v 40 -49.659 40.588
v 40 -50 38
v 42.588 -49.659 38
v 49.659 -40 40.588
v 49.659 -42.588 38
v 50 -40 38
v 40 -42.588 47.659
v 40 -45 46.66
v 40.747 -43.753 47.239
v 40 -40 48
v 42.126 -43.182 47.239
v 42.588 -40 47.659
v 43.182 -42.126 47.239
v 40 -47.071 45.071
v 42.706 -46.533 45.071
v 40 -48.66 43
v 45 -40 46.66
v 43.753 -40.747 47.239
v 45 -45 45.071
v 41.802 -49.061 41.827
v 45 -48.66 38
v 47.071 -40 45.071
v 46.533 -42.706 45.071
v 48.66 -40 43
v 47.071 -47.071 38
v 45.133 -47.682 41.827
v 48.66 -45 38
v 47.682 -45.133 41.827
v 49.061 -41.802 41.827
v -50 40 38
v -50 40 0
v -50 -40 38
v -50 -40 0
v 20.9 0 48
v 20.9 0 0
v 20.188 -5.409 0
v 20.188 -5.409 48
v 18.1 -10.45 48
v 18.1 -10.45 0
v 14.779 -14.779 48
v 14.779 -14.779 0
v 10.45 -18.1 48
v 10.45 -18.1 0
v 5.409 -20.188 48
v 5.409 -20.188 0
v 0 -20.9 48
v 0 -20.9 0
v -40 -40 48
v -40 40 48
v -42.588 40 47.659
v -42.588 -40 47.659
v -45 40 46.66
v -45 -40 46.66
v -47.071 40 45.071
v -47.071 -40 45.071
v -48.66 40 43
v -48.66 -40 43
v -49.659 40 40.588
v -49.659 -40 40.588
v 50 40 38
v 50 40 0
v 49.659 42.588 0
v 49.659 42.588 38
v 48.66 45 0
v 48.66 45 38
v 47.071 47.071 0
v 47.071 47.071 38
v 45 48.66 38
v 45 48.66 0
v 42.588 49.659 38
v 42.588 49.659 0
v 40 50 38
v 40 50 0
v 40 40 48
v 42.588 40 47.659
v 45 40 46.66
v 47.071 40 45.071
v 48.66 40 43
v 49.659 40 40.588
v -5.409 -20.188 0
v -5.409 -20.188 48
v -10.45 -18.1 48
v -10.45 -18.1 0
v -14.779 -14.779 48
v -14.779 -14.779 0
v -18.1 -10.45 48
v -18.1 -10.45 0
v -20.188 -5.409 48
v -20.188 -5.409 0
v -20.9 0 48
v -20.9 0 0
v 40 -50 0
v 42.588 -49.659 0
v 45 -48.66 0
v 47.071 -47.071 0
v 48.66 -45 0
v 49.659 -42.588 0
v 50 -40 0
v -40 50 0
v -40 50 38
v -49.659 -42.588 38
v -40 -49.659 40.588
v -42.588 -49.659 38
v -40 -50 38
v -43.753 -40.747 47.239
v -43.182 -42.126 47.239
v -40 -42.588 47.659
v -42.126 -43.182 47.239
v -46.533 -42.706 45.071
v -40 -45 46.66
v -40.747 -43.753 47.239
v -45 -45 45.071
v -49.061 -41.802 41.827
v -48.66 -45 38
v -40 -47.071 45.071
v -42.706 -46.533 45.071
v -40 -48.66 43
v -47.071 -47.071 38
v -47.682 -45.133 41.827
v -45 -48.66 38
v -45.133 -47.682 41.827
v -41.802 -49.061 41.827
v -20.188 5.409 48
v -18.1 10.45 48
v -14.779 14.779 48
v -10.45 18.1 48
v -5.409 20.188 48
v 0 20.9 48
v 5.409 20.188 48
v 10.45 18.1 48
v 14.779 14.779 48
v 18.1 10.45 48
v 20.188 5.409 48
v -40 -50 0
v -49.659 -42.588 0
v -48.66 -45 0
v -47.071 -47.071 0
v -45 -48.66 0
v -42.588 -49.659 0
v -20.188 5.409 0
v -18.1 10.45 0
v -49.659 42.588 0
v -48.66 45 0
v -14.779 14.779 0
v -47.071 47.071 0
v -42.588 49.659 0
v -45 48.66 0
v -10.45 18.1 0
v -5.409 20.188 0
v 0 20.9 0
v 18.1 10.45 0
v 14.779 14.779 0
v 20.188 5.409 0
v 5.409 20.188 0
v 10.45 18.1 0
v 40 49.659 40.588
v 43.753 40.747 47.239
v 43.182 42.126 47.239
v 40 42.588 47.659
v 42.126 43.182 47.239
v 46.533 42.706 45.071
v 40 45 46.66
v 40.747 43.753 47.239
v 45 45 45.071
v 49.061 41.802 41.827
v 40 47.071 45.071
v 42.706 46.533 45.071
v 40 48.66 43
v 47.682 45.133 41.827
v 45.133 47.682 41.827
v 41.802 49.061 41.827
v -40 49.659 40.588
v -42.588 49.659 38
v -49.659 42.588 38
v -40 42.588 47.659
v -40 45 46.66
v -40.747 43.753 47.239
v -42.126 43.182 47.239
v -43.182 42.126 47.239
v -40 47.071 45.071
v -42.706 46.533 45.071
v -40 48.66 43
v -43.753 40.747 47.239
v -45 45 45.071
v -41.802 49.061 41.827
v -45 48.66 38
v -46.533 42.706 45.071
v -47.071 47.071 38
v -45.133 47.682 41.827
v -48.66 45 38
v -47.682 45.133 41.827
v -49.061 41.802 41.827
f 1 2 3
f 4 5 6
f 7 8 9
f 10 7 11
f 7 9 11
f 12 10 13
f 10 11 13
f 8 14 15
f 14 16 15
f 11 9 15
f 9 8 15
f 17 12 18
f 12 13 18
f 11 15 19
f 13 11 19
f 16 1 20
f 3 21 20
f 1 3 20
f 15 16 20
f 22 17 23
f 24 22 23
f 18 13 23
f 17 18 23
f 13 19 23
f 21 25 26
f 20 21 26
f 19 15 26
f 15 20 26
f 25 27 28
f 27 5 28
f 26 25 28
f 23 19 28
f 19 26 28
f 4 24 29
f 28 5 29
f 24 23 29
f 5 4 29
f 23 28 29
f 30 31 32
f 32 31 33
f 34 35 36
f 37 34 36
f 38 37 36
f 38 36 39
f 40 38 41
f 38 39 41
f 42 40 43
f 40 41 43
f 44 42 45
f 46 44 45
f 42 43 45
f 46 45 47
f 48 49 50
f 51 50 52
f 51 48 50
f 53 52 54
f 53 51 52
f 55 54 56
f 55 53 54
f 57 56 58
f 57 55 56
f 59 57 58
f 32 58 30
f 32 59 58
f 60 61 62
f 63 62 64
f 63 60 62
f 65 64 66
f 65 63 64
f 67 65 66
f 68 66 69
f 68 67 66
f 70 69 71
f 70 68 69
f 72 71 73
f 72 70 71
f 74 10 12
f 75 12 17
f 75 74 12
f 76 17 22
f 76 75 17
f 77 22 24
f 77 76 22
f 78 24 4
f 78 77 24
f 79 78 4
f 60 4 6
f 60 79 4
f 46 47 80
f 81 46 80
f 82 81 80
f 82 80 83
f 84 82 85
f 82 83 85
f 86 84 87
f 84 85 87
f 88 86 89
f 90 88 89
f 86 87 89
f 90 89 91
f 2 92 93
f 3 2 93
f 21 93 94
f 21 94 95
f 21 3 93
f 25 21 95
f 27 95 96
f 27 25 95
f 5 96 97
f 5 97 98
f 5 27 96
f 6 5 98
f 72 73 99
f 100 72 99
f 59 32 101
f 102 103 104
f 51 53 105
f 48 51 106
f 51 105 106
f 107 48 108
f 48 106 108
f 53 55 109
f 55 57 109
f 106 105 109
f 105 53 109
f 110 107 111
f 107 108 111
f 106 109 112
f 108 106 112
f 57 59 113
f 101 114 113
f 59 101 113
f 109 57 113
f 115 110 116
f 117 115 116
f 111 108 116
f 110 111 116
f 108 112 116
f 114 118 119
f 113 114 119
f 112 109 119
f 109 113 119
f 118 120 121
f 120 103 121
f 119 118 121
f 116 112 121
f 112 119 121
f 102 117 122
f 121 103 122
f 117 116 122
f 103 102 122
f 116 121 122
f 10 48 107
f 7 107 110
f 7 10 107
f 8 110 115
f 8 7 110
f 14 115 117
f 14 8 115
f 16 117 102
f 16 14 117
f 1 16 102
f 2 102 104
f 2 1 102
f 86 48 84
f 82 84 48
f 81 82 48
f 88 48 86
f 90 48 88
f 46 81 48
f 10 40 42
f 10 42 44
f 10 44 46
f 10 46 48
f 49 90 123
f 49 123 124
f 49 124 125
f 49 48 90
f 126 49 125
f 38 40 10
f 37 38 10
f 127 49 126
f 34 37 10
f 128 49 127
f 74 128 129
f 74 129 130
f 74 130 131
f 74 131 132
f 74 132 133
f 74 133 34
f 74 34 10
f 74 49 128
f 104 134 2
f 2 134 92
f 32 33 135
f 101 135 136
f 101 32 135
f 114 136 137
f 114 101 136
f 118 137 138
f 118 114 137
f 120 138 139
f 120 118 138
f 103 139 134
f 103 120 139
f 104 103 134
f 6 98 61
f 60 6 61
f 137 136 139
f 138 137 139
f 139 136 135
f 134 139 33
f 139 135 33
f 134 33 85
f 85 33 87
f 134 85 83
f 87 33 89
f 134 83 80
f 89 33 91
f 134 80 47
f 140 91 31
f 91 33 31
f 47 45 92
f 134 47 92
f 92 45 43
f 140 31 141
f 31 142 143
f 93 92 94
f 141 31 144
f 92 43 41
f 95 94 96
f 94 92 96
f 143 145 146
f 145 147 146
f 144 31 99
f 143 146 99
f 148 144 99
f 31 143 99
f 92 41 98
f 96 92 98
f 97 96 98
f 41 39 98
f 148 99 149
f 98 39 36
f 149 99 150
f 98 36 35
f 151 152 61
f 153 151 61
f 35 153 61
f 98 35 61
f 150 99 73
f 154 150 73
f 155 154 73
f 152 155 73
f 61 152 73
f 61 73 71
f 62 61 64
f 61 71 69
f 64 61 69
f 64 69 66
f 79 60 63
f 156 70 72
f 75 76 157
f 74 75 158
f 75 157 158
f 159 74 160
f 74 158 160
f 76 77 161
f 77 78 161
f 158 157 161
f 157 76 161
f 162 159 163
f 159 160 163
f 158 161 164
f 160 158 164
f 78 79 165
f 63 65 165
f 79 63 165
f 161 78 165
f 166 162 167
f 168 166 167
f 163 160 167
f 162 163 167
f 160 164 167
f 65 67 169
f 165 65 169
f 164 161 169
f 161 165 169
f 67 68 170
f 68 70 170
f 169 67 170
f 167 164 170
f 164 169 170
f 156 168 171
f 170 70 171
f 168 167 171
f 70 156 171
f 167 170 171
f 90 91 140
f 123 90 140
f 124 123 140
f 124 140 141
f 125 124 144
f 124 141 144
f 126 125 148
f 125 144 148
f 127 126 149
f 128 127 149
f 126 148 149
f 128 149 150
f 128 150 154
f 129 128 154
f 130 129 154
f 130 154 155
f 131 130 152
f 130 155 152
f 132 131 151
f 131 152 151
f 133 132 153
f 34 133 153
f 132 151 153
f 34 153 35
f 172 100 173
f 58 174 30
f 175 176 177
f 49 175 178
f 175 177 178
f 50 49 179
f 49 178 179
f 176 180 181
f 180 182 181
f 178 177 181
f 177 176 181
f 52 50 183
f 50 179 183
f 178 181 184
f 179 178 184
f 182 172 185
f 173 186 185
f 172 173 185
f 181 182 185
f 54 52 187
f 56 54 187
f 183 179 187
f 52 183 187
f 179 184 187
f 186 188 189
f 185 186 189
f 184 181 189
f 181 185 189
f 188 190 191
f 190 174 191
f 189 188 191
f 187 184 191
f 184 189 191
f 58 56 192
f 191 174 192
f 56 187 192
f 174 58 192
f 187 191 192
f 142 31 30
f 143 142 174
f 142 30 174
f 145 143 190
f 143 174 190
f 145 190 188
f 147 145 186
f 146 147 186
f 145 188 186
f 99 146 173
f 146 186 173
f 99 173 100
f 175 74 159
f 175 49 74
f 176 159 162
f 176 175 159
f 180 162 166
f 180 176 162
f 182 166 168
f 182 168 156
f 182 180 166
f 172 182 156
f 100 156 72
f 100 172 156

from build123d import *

# Parameters (mm, degrees)
EXTRUDE_1_DEPTH = 48
FILLET_1_R      = 10
FILLET_3_R      = 10


with BuildPart() as part:
    # 草图1 → 凸台-拉伸1 (new body)
    with BuildSketch(Plane.XY):
        with BuildLine():
            Line((0, 20.9), (0, 25))
            Line((0, 25), (0, 48.210201589))
            Line((0, 48.210201589), (0, 50))
            Line((0, 50), (-50, 50))
            Line((-50, 50), (-50, 0))
            Line((-50, 0), (-20.9, 0))
            ThreePointArc((-20.9, 0), (-14.778531727, 14.778531727), (0, 20.9))
        make_face()
        with BuildLine():
            Line((50, 0), (20.9, 0))
            ThreePointArc((20.9, 0), (14.778531727, -14.778531727), (0, -20.9))
            Line((0, -20.9), (0, -25))
            Line((0, -25), (50, -25))
            Line((50, -25), (50, 0))
        make_face()
        with BuildLine():
            Line((50, 25), (0, 25))
            Line((0, 25), (0, 20.9))
            ThreePointArc((0, 20.9), (14.778531727, 14.778531727), (20.9, 0))
            Line((20.9, 0), (50, 0))
            Line((50, 0), (50, 25))
        make_face()
        Polygon((0, 48.210201589), (0, 25), (50, 25), (50, 50), (0, 50), align=None)
        with BuildLine():
            ThreePointArc((0, -20.9), (-14.778531727, -14.778531727), (-20.9, 0))
            Line((-20.9, 0), (-50, 0))
            Line((-50, 0), (-50, -50))
            Line((-50, -50), (50, -50))
            Line((50, -50), (50, -25))
            Line((50, -25), (0, -25))
            Line((0, -25), (0, -20.9))
        make_face()
    extrude(amount=EXTRUDE_1_DEPTH)

    # 圆角1
    fillet_1_edges = [part.edges().sort_by_distance(p)[0] for p in [
        (-50, -50, 24),
        (-50, 50, 24),
        (50, 50, 24),
        (50, -50, 24),
    ]]
    fillet(fillet_1_edges, radius=FILLET_1_R)

    # 圆角3
    fillet_3_edges = [part.edges().sort_by_distance(p)[0] for p in [
        (0, 50, 48),
        (50, 0, 48),
        (0, -50, 48),
        (-50, 0, 48),
        (-47.071067812, 47.071067812, 48),
        (-47.071067812, -47.071067812, 48),
        (47.071067812, -47.071067812, 48),
        (47.071067812, 47.071067812, 48),
    ]]
    fillet(fillet_3_edges, radius=FILLET_3_R)


solid = part.part
